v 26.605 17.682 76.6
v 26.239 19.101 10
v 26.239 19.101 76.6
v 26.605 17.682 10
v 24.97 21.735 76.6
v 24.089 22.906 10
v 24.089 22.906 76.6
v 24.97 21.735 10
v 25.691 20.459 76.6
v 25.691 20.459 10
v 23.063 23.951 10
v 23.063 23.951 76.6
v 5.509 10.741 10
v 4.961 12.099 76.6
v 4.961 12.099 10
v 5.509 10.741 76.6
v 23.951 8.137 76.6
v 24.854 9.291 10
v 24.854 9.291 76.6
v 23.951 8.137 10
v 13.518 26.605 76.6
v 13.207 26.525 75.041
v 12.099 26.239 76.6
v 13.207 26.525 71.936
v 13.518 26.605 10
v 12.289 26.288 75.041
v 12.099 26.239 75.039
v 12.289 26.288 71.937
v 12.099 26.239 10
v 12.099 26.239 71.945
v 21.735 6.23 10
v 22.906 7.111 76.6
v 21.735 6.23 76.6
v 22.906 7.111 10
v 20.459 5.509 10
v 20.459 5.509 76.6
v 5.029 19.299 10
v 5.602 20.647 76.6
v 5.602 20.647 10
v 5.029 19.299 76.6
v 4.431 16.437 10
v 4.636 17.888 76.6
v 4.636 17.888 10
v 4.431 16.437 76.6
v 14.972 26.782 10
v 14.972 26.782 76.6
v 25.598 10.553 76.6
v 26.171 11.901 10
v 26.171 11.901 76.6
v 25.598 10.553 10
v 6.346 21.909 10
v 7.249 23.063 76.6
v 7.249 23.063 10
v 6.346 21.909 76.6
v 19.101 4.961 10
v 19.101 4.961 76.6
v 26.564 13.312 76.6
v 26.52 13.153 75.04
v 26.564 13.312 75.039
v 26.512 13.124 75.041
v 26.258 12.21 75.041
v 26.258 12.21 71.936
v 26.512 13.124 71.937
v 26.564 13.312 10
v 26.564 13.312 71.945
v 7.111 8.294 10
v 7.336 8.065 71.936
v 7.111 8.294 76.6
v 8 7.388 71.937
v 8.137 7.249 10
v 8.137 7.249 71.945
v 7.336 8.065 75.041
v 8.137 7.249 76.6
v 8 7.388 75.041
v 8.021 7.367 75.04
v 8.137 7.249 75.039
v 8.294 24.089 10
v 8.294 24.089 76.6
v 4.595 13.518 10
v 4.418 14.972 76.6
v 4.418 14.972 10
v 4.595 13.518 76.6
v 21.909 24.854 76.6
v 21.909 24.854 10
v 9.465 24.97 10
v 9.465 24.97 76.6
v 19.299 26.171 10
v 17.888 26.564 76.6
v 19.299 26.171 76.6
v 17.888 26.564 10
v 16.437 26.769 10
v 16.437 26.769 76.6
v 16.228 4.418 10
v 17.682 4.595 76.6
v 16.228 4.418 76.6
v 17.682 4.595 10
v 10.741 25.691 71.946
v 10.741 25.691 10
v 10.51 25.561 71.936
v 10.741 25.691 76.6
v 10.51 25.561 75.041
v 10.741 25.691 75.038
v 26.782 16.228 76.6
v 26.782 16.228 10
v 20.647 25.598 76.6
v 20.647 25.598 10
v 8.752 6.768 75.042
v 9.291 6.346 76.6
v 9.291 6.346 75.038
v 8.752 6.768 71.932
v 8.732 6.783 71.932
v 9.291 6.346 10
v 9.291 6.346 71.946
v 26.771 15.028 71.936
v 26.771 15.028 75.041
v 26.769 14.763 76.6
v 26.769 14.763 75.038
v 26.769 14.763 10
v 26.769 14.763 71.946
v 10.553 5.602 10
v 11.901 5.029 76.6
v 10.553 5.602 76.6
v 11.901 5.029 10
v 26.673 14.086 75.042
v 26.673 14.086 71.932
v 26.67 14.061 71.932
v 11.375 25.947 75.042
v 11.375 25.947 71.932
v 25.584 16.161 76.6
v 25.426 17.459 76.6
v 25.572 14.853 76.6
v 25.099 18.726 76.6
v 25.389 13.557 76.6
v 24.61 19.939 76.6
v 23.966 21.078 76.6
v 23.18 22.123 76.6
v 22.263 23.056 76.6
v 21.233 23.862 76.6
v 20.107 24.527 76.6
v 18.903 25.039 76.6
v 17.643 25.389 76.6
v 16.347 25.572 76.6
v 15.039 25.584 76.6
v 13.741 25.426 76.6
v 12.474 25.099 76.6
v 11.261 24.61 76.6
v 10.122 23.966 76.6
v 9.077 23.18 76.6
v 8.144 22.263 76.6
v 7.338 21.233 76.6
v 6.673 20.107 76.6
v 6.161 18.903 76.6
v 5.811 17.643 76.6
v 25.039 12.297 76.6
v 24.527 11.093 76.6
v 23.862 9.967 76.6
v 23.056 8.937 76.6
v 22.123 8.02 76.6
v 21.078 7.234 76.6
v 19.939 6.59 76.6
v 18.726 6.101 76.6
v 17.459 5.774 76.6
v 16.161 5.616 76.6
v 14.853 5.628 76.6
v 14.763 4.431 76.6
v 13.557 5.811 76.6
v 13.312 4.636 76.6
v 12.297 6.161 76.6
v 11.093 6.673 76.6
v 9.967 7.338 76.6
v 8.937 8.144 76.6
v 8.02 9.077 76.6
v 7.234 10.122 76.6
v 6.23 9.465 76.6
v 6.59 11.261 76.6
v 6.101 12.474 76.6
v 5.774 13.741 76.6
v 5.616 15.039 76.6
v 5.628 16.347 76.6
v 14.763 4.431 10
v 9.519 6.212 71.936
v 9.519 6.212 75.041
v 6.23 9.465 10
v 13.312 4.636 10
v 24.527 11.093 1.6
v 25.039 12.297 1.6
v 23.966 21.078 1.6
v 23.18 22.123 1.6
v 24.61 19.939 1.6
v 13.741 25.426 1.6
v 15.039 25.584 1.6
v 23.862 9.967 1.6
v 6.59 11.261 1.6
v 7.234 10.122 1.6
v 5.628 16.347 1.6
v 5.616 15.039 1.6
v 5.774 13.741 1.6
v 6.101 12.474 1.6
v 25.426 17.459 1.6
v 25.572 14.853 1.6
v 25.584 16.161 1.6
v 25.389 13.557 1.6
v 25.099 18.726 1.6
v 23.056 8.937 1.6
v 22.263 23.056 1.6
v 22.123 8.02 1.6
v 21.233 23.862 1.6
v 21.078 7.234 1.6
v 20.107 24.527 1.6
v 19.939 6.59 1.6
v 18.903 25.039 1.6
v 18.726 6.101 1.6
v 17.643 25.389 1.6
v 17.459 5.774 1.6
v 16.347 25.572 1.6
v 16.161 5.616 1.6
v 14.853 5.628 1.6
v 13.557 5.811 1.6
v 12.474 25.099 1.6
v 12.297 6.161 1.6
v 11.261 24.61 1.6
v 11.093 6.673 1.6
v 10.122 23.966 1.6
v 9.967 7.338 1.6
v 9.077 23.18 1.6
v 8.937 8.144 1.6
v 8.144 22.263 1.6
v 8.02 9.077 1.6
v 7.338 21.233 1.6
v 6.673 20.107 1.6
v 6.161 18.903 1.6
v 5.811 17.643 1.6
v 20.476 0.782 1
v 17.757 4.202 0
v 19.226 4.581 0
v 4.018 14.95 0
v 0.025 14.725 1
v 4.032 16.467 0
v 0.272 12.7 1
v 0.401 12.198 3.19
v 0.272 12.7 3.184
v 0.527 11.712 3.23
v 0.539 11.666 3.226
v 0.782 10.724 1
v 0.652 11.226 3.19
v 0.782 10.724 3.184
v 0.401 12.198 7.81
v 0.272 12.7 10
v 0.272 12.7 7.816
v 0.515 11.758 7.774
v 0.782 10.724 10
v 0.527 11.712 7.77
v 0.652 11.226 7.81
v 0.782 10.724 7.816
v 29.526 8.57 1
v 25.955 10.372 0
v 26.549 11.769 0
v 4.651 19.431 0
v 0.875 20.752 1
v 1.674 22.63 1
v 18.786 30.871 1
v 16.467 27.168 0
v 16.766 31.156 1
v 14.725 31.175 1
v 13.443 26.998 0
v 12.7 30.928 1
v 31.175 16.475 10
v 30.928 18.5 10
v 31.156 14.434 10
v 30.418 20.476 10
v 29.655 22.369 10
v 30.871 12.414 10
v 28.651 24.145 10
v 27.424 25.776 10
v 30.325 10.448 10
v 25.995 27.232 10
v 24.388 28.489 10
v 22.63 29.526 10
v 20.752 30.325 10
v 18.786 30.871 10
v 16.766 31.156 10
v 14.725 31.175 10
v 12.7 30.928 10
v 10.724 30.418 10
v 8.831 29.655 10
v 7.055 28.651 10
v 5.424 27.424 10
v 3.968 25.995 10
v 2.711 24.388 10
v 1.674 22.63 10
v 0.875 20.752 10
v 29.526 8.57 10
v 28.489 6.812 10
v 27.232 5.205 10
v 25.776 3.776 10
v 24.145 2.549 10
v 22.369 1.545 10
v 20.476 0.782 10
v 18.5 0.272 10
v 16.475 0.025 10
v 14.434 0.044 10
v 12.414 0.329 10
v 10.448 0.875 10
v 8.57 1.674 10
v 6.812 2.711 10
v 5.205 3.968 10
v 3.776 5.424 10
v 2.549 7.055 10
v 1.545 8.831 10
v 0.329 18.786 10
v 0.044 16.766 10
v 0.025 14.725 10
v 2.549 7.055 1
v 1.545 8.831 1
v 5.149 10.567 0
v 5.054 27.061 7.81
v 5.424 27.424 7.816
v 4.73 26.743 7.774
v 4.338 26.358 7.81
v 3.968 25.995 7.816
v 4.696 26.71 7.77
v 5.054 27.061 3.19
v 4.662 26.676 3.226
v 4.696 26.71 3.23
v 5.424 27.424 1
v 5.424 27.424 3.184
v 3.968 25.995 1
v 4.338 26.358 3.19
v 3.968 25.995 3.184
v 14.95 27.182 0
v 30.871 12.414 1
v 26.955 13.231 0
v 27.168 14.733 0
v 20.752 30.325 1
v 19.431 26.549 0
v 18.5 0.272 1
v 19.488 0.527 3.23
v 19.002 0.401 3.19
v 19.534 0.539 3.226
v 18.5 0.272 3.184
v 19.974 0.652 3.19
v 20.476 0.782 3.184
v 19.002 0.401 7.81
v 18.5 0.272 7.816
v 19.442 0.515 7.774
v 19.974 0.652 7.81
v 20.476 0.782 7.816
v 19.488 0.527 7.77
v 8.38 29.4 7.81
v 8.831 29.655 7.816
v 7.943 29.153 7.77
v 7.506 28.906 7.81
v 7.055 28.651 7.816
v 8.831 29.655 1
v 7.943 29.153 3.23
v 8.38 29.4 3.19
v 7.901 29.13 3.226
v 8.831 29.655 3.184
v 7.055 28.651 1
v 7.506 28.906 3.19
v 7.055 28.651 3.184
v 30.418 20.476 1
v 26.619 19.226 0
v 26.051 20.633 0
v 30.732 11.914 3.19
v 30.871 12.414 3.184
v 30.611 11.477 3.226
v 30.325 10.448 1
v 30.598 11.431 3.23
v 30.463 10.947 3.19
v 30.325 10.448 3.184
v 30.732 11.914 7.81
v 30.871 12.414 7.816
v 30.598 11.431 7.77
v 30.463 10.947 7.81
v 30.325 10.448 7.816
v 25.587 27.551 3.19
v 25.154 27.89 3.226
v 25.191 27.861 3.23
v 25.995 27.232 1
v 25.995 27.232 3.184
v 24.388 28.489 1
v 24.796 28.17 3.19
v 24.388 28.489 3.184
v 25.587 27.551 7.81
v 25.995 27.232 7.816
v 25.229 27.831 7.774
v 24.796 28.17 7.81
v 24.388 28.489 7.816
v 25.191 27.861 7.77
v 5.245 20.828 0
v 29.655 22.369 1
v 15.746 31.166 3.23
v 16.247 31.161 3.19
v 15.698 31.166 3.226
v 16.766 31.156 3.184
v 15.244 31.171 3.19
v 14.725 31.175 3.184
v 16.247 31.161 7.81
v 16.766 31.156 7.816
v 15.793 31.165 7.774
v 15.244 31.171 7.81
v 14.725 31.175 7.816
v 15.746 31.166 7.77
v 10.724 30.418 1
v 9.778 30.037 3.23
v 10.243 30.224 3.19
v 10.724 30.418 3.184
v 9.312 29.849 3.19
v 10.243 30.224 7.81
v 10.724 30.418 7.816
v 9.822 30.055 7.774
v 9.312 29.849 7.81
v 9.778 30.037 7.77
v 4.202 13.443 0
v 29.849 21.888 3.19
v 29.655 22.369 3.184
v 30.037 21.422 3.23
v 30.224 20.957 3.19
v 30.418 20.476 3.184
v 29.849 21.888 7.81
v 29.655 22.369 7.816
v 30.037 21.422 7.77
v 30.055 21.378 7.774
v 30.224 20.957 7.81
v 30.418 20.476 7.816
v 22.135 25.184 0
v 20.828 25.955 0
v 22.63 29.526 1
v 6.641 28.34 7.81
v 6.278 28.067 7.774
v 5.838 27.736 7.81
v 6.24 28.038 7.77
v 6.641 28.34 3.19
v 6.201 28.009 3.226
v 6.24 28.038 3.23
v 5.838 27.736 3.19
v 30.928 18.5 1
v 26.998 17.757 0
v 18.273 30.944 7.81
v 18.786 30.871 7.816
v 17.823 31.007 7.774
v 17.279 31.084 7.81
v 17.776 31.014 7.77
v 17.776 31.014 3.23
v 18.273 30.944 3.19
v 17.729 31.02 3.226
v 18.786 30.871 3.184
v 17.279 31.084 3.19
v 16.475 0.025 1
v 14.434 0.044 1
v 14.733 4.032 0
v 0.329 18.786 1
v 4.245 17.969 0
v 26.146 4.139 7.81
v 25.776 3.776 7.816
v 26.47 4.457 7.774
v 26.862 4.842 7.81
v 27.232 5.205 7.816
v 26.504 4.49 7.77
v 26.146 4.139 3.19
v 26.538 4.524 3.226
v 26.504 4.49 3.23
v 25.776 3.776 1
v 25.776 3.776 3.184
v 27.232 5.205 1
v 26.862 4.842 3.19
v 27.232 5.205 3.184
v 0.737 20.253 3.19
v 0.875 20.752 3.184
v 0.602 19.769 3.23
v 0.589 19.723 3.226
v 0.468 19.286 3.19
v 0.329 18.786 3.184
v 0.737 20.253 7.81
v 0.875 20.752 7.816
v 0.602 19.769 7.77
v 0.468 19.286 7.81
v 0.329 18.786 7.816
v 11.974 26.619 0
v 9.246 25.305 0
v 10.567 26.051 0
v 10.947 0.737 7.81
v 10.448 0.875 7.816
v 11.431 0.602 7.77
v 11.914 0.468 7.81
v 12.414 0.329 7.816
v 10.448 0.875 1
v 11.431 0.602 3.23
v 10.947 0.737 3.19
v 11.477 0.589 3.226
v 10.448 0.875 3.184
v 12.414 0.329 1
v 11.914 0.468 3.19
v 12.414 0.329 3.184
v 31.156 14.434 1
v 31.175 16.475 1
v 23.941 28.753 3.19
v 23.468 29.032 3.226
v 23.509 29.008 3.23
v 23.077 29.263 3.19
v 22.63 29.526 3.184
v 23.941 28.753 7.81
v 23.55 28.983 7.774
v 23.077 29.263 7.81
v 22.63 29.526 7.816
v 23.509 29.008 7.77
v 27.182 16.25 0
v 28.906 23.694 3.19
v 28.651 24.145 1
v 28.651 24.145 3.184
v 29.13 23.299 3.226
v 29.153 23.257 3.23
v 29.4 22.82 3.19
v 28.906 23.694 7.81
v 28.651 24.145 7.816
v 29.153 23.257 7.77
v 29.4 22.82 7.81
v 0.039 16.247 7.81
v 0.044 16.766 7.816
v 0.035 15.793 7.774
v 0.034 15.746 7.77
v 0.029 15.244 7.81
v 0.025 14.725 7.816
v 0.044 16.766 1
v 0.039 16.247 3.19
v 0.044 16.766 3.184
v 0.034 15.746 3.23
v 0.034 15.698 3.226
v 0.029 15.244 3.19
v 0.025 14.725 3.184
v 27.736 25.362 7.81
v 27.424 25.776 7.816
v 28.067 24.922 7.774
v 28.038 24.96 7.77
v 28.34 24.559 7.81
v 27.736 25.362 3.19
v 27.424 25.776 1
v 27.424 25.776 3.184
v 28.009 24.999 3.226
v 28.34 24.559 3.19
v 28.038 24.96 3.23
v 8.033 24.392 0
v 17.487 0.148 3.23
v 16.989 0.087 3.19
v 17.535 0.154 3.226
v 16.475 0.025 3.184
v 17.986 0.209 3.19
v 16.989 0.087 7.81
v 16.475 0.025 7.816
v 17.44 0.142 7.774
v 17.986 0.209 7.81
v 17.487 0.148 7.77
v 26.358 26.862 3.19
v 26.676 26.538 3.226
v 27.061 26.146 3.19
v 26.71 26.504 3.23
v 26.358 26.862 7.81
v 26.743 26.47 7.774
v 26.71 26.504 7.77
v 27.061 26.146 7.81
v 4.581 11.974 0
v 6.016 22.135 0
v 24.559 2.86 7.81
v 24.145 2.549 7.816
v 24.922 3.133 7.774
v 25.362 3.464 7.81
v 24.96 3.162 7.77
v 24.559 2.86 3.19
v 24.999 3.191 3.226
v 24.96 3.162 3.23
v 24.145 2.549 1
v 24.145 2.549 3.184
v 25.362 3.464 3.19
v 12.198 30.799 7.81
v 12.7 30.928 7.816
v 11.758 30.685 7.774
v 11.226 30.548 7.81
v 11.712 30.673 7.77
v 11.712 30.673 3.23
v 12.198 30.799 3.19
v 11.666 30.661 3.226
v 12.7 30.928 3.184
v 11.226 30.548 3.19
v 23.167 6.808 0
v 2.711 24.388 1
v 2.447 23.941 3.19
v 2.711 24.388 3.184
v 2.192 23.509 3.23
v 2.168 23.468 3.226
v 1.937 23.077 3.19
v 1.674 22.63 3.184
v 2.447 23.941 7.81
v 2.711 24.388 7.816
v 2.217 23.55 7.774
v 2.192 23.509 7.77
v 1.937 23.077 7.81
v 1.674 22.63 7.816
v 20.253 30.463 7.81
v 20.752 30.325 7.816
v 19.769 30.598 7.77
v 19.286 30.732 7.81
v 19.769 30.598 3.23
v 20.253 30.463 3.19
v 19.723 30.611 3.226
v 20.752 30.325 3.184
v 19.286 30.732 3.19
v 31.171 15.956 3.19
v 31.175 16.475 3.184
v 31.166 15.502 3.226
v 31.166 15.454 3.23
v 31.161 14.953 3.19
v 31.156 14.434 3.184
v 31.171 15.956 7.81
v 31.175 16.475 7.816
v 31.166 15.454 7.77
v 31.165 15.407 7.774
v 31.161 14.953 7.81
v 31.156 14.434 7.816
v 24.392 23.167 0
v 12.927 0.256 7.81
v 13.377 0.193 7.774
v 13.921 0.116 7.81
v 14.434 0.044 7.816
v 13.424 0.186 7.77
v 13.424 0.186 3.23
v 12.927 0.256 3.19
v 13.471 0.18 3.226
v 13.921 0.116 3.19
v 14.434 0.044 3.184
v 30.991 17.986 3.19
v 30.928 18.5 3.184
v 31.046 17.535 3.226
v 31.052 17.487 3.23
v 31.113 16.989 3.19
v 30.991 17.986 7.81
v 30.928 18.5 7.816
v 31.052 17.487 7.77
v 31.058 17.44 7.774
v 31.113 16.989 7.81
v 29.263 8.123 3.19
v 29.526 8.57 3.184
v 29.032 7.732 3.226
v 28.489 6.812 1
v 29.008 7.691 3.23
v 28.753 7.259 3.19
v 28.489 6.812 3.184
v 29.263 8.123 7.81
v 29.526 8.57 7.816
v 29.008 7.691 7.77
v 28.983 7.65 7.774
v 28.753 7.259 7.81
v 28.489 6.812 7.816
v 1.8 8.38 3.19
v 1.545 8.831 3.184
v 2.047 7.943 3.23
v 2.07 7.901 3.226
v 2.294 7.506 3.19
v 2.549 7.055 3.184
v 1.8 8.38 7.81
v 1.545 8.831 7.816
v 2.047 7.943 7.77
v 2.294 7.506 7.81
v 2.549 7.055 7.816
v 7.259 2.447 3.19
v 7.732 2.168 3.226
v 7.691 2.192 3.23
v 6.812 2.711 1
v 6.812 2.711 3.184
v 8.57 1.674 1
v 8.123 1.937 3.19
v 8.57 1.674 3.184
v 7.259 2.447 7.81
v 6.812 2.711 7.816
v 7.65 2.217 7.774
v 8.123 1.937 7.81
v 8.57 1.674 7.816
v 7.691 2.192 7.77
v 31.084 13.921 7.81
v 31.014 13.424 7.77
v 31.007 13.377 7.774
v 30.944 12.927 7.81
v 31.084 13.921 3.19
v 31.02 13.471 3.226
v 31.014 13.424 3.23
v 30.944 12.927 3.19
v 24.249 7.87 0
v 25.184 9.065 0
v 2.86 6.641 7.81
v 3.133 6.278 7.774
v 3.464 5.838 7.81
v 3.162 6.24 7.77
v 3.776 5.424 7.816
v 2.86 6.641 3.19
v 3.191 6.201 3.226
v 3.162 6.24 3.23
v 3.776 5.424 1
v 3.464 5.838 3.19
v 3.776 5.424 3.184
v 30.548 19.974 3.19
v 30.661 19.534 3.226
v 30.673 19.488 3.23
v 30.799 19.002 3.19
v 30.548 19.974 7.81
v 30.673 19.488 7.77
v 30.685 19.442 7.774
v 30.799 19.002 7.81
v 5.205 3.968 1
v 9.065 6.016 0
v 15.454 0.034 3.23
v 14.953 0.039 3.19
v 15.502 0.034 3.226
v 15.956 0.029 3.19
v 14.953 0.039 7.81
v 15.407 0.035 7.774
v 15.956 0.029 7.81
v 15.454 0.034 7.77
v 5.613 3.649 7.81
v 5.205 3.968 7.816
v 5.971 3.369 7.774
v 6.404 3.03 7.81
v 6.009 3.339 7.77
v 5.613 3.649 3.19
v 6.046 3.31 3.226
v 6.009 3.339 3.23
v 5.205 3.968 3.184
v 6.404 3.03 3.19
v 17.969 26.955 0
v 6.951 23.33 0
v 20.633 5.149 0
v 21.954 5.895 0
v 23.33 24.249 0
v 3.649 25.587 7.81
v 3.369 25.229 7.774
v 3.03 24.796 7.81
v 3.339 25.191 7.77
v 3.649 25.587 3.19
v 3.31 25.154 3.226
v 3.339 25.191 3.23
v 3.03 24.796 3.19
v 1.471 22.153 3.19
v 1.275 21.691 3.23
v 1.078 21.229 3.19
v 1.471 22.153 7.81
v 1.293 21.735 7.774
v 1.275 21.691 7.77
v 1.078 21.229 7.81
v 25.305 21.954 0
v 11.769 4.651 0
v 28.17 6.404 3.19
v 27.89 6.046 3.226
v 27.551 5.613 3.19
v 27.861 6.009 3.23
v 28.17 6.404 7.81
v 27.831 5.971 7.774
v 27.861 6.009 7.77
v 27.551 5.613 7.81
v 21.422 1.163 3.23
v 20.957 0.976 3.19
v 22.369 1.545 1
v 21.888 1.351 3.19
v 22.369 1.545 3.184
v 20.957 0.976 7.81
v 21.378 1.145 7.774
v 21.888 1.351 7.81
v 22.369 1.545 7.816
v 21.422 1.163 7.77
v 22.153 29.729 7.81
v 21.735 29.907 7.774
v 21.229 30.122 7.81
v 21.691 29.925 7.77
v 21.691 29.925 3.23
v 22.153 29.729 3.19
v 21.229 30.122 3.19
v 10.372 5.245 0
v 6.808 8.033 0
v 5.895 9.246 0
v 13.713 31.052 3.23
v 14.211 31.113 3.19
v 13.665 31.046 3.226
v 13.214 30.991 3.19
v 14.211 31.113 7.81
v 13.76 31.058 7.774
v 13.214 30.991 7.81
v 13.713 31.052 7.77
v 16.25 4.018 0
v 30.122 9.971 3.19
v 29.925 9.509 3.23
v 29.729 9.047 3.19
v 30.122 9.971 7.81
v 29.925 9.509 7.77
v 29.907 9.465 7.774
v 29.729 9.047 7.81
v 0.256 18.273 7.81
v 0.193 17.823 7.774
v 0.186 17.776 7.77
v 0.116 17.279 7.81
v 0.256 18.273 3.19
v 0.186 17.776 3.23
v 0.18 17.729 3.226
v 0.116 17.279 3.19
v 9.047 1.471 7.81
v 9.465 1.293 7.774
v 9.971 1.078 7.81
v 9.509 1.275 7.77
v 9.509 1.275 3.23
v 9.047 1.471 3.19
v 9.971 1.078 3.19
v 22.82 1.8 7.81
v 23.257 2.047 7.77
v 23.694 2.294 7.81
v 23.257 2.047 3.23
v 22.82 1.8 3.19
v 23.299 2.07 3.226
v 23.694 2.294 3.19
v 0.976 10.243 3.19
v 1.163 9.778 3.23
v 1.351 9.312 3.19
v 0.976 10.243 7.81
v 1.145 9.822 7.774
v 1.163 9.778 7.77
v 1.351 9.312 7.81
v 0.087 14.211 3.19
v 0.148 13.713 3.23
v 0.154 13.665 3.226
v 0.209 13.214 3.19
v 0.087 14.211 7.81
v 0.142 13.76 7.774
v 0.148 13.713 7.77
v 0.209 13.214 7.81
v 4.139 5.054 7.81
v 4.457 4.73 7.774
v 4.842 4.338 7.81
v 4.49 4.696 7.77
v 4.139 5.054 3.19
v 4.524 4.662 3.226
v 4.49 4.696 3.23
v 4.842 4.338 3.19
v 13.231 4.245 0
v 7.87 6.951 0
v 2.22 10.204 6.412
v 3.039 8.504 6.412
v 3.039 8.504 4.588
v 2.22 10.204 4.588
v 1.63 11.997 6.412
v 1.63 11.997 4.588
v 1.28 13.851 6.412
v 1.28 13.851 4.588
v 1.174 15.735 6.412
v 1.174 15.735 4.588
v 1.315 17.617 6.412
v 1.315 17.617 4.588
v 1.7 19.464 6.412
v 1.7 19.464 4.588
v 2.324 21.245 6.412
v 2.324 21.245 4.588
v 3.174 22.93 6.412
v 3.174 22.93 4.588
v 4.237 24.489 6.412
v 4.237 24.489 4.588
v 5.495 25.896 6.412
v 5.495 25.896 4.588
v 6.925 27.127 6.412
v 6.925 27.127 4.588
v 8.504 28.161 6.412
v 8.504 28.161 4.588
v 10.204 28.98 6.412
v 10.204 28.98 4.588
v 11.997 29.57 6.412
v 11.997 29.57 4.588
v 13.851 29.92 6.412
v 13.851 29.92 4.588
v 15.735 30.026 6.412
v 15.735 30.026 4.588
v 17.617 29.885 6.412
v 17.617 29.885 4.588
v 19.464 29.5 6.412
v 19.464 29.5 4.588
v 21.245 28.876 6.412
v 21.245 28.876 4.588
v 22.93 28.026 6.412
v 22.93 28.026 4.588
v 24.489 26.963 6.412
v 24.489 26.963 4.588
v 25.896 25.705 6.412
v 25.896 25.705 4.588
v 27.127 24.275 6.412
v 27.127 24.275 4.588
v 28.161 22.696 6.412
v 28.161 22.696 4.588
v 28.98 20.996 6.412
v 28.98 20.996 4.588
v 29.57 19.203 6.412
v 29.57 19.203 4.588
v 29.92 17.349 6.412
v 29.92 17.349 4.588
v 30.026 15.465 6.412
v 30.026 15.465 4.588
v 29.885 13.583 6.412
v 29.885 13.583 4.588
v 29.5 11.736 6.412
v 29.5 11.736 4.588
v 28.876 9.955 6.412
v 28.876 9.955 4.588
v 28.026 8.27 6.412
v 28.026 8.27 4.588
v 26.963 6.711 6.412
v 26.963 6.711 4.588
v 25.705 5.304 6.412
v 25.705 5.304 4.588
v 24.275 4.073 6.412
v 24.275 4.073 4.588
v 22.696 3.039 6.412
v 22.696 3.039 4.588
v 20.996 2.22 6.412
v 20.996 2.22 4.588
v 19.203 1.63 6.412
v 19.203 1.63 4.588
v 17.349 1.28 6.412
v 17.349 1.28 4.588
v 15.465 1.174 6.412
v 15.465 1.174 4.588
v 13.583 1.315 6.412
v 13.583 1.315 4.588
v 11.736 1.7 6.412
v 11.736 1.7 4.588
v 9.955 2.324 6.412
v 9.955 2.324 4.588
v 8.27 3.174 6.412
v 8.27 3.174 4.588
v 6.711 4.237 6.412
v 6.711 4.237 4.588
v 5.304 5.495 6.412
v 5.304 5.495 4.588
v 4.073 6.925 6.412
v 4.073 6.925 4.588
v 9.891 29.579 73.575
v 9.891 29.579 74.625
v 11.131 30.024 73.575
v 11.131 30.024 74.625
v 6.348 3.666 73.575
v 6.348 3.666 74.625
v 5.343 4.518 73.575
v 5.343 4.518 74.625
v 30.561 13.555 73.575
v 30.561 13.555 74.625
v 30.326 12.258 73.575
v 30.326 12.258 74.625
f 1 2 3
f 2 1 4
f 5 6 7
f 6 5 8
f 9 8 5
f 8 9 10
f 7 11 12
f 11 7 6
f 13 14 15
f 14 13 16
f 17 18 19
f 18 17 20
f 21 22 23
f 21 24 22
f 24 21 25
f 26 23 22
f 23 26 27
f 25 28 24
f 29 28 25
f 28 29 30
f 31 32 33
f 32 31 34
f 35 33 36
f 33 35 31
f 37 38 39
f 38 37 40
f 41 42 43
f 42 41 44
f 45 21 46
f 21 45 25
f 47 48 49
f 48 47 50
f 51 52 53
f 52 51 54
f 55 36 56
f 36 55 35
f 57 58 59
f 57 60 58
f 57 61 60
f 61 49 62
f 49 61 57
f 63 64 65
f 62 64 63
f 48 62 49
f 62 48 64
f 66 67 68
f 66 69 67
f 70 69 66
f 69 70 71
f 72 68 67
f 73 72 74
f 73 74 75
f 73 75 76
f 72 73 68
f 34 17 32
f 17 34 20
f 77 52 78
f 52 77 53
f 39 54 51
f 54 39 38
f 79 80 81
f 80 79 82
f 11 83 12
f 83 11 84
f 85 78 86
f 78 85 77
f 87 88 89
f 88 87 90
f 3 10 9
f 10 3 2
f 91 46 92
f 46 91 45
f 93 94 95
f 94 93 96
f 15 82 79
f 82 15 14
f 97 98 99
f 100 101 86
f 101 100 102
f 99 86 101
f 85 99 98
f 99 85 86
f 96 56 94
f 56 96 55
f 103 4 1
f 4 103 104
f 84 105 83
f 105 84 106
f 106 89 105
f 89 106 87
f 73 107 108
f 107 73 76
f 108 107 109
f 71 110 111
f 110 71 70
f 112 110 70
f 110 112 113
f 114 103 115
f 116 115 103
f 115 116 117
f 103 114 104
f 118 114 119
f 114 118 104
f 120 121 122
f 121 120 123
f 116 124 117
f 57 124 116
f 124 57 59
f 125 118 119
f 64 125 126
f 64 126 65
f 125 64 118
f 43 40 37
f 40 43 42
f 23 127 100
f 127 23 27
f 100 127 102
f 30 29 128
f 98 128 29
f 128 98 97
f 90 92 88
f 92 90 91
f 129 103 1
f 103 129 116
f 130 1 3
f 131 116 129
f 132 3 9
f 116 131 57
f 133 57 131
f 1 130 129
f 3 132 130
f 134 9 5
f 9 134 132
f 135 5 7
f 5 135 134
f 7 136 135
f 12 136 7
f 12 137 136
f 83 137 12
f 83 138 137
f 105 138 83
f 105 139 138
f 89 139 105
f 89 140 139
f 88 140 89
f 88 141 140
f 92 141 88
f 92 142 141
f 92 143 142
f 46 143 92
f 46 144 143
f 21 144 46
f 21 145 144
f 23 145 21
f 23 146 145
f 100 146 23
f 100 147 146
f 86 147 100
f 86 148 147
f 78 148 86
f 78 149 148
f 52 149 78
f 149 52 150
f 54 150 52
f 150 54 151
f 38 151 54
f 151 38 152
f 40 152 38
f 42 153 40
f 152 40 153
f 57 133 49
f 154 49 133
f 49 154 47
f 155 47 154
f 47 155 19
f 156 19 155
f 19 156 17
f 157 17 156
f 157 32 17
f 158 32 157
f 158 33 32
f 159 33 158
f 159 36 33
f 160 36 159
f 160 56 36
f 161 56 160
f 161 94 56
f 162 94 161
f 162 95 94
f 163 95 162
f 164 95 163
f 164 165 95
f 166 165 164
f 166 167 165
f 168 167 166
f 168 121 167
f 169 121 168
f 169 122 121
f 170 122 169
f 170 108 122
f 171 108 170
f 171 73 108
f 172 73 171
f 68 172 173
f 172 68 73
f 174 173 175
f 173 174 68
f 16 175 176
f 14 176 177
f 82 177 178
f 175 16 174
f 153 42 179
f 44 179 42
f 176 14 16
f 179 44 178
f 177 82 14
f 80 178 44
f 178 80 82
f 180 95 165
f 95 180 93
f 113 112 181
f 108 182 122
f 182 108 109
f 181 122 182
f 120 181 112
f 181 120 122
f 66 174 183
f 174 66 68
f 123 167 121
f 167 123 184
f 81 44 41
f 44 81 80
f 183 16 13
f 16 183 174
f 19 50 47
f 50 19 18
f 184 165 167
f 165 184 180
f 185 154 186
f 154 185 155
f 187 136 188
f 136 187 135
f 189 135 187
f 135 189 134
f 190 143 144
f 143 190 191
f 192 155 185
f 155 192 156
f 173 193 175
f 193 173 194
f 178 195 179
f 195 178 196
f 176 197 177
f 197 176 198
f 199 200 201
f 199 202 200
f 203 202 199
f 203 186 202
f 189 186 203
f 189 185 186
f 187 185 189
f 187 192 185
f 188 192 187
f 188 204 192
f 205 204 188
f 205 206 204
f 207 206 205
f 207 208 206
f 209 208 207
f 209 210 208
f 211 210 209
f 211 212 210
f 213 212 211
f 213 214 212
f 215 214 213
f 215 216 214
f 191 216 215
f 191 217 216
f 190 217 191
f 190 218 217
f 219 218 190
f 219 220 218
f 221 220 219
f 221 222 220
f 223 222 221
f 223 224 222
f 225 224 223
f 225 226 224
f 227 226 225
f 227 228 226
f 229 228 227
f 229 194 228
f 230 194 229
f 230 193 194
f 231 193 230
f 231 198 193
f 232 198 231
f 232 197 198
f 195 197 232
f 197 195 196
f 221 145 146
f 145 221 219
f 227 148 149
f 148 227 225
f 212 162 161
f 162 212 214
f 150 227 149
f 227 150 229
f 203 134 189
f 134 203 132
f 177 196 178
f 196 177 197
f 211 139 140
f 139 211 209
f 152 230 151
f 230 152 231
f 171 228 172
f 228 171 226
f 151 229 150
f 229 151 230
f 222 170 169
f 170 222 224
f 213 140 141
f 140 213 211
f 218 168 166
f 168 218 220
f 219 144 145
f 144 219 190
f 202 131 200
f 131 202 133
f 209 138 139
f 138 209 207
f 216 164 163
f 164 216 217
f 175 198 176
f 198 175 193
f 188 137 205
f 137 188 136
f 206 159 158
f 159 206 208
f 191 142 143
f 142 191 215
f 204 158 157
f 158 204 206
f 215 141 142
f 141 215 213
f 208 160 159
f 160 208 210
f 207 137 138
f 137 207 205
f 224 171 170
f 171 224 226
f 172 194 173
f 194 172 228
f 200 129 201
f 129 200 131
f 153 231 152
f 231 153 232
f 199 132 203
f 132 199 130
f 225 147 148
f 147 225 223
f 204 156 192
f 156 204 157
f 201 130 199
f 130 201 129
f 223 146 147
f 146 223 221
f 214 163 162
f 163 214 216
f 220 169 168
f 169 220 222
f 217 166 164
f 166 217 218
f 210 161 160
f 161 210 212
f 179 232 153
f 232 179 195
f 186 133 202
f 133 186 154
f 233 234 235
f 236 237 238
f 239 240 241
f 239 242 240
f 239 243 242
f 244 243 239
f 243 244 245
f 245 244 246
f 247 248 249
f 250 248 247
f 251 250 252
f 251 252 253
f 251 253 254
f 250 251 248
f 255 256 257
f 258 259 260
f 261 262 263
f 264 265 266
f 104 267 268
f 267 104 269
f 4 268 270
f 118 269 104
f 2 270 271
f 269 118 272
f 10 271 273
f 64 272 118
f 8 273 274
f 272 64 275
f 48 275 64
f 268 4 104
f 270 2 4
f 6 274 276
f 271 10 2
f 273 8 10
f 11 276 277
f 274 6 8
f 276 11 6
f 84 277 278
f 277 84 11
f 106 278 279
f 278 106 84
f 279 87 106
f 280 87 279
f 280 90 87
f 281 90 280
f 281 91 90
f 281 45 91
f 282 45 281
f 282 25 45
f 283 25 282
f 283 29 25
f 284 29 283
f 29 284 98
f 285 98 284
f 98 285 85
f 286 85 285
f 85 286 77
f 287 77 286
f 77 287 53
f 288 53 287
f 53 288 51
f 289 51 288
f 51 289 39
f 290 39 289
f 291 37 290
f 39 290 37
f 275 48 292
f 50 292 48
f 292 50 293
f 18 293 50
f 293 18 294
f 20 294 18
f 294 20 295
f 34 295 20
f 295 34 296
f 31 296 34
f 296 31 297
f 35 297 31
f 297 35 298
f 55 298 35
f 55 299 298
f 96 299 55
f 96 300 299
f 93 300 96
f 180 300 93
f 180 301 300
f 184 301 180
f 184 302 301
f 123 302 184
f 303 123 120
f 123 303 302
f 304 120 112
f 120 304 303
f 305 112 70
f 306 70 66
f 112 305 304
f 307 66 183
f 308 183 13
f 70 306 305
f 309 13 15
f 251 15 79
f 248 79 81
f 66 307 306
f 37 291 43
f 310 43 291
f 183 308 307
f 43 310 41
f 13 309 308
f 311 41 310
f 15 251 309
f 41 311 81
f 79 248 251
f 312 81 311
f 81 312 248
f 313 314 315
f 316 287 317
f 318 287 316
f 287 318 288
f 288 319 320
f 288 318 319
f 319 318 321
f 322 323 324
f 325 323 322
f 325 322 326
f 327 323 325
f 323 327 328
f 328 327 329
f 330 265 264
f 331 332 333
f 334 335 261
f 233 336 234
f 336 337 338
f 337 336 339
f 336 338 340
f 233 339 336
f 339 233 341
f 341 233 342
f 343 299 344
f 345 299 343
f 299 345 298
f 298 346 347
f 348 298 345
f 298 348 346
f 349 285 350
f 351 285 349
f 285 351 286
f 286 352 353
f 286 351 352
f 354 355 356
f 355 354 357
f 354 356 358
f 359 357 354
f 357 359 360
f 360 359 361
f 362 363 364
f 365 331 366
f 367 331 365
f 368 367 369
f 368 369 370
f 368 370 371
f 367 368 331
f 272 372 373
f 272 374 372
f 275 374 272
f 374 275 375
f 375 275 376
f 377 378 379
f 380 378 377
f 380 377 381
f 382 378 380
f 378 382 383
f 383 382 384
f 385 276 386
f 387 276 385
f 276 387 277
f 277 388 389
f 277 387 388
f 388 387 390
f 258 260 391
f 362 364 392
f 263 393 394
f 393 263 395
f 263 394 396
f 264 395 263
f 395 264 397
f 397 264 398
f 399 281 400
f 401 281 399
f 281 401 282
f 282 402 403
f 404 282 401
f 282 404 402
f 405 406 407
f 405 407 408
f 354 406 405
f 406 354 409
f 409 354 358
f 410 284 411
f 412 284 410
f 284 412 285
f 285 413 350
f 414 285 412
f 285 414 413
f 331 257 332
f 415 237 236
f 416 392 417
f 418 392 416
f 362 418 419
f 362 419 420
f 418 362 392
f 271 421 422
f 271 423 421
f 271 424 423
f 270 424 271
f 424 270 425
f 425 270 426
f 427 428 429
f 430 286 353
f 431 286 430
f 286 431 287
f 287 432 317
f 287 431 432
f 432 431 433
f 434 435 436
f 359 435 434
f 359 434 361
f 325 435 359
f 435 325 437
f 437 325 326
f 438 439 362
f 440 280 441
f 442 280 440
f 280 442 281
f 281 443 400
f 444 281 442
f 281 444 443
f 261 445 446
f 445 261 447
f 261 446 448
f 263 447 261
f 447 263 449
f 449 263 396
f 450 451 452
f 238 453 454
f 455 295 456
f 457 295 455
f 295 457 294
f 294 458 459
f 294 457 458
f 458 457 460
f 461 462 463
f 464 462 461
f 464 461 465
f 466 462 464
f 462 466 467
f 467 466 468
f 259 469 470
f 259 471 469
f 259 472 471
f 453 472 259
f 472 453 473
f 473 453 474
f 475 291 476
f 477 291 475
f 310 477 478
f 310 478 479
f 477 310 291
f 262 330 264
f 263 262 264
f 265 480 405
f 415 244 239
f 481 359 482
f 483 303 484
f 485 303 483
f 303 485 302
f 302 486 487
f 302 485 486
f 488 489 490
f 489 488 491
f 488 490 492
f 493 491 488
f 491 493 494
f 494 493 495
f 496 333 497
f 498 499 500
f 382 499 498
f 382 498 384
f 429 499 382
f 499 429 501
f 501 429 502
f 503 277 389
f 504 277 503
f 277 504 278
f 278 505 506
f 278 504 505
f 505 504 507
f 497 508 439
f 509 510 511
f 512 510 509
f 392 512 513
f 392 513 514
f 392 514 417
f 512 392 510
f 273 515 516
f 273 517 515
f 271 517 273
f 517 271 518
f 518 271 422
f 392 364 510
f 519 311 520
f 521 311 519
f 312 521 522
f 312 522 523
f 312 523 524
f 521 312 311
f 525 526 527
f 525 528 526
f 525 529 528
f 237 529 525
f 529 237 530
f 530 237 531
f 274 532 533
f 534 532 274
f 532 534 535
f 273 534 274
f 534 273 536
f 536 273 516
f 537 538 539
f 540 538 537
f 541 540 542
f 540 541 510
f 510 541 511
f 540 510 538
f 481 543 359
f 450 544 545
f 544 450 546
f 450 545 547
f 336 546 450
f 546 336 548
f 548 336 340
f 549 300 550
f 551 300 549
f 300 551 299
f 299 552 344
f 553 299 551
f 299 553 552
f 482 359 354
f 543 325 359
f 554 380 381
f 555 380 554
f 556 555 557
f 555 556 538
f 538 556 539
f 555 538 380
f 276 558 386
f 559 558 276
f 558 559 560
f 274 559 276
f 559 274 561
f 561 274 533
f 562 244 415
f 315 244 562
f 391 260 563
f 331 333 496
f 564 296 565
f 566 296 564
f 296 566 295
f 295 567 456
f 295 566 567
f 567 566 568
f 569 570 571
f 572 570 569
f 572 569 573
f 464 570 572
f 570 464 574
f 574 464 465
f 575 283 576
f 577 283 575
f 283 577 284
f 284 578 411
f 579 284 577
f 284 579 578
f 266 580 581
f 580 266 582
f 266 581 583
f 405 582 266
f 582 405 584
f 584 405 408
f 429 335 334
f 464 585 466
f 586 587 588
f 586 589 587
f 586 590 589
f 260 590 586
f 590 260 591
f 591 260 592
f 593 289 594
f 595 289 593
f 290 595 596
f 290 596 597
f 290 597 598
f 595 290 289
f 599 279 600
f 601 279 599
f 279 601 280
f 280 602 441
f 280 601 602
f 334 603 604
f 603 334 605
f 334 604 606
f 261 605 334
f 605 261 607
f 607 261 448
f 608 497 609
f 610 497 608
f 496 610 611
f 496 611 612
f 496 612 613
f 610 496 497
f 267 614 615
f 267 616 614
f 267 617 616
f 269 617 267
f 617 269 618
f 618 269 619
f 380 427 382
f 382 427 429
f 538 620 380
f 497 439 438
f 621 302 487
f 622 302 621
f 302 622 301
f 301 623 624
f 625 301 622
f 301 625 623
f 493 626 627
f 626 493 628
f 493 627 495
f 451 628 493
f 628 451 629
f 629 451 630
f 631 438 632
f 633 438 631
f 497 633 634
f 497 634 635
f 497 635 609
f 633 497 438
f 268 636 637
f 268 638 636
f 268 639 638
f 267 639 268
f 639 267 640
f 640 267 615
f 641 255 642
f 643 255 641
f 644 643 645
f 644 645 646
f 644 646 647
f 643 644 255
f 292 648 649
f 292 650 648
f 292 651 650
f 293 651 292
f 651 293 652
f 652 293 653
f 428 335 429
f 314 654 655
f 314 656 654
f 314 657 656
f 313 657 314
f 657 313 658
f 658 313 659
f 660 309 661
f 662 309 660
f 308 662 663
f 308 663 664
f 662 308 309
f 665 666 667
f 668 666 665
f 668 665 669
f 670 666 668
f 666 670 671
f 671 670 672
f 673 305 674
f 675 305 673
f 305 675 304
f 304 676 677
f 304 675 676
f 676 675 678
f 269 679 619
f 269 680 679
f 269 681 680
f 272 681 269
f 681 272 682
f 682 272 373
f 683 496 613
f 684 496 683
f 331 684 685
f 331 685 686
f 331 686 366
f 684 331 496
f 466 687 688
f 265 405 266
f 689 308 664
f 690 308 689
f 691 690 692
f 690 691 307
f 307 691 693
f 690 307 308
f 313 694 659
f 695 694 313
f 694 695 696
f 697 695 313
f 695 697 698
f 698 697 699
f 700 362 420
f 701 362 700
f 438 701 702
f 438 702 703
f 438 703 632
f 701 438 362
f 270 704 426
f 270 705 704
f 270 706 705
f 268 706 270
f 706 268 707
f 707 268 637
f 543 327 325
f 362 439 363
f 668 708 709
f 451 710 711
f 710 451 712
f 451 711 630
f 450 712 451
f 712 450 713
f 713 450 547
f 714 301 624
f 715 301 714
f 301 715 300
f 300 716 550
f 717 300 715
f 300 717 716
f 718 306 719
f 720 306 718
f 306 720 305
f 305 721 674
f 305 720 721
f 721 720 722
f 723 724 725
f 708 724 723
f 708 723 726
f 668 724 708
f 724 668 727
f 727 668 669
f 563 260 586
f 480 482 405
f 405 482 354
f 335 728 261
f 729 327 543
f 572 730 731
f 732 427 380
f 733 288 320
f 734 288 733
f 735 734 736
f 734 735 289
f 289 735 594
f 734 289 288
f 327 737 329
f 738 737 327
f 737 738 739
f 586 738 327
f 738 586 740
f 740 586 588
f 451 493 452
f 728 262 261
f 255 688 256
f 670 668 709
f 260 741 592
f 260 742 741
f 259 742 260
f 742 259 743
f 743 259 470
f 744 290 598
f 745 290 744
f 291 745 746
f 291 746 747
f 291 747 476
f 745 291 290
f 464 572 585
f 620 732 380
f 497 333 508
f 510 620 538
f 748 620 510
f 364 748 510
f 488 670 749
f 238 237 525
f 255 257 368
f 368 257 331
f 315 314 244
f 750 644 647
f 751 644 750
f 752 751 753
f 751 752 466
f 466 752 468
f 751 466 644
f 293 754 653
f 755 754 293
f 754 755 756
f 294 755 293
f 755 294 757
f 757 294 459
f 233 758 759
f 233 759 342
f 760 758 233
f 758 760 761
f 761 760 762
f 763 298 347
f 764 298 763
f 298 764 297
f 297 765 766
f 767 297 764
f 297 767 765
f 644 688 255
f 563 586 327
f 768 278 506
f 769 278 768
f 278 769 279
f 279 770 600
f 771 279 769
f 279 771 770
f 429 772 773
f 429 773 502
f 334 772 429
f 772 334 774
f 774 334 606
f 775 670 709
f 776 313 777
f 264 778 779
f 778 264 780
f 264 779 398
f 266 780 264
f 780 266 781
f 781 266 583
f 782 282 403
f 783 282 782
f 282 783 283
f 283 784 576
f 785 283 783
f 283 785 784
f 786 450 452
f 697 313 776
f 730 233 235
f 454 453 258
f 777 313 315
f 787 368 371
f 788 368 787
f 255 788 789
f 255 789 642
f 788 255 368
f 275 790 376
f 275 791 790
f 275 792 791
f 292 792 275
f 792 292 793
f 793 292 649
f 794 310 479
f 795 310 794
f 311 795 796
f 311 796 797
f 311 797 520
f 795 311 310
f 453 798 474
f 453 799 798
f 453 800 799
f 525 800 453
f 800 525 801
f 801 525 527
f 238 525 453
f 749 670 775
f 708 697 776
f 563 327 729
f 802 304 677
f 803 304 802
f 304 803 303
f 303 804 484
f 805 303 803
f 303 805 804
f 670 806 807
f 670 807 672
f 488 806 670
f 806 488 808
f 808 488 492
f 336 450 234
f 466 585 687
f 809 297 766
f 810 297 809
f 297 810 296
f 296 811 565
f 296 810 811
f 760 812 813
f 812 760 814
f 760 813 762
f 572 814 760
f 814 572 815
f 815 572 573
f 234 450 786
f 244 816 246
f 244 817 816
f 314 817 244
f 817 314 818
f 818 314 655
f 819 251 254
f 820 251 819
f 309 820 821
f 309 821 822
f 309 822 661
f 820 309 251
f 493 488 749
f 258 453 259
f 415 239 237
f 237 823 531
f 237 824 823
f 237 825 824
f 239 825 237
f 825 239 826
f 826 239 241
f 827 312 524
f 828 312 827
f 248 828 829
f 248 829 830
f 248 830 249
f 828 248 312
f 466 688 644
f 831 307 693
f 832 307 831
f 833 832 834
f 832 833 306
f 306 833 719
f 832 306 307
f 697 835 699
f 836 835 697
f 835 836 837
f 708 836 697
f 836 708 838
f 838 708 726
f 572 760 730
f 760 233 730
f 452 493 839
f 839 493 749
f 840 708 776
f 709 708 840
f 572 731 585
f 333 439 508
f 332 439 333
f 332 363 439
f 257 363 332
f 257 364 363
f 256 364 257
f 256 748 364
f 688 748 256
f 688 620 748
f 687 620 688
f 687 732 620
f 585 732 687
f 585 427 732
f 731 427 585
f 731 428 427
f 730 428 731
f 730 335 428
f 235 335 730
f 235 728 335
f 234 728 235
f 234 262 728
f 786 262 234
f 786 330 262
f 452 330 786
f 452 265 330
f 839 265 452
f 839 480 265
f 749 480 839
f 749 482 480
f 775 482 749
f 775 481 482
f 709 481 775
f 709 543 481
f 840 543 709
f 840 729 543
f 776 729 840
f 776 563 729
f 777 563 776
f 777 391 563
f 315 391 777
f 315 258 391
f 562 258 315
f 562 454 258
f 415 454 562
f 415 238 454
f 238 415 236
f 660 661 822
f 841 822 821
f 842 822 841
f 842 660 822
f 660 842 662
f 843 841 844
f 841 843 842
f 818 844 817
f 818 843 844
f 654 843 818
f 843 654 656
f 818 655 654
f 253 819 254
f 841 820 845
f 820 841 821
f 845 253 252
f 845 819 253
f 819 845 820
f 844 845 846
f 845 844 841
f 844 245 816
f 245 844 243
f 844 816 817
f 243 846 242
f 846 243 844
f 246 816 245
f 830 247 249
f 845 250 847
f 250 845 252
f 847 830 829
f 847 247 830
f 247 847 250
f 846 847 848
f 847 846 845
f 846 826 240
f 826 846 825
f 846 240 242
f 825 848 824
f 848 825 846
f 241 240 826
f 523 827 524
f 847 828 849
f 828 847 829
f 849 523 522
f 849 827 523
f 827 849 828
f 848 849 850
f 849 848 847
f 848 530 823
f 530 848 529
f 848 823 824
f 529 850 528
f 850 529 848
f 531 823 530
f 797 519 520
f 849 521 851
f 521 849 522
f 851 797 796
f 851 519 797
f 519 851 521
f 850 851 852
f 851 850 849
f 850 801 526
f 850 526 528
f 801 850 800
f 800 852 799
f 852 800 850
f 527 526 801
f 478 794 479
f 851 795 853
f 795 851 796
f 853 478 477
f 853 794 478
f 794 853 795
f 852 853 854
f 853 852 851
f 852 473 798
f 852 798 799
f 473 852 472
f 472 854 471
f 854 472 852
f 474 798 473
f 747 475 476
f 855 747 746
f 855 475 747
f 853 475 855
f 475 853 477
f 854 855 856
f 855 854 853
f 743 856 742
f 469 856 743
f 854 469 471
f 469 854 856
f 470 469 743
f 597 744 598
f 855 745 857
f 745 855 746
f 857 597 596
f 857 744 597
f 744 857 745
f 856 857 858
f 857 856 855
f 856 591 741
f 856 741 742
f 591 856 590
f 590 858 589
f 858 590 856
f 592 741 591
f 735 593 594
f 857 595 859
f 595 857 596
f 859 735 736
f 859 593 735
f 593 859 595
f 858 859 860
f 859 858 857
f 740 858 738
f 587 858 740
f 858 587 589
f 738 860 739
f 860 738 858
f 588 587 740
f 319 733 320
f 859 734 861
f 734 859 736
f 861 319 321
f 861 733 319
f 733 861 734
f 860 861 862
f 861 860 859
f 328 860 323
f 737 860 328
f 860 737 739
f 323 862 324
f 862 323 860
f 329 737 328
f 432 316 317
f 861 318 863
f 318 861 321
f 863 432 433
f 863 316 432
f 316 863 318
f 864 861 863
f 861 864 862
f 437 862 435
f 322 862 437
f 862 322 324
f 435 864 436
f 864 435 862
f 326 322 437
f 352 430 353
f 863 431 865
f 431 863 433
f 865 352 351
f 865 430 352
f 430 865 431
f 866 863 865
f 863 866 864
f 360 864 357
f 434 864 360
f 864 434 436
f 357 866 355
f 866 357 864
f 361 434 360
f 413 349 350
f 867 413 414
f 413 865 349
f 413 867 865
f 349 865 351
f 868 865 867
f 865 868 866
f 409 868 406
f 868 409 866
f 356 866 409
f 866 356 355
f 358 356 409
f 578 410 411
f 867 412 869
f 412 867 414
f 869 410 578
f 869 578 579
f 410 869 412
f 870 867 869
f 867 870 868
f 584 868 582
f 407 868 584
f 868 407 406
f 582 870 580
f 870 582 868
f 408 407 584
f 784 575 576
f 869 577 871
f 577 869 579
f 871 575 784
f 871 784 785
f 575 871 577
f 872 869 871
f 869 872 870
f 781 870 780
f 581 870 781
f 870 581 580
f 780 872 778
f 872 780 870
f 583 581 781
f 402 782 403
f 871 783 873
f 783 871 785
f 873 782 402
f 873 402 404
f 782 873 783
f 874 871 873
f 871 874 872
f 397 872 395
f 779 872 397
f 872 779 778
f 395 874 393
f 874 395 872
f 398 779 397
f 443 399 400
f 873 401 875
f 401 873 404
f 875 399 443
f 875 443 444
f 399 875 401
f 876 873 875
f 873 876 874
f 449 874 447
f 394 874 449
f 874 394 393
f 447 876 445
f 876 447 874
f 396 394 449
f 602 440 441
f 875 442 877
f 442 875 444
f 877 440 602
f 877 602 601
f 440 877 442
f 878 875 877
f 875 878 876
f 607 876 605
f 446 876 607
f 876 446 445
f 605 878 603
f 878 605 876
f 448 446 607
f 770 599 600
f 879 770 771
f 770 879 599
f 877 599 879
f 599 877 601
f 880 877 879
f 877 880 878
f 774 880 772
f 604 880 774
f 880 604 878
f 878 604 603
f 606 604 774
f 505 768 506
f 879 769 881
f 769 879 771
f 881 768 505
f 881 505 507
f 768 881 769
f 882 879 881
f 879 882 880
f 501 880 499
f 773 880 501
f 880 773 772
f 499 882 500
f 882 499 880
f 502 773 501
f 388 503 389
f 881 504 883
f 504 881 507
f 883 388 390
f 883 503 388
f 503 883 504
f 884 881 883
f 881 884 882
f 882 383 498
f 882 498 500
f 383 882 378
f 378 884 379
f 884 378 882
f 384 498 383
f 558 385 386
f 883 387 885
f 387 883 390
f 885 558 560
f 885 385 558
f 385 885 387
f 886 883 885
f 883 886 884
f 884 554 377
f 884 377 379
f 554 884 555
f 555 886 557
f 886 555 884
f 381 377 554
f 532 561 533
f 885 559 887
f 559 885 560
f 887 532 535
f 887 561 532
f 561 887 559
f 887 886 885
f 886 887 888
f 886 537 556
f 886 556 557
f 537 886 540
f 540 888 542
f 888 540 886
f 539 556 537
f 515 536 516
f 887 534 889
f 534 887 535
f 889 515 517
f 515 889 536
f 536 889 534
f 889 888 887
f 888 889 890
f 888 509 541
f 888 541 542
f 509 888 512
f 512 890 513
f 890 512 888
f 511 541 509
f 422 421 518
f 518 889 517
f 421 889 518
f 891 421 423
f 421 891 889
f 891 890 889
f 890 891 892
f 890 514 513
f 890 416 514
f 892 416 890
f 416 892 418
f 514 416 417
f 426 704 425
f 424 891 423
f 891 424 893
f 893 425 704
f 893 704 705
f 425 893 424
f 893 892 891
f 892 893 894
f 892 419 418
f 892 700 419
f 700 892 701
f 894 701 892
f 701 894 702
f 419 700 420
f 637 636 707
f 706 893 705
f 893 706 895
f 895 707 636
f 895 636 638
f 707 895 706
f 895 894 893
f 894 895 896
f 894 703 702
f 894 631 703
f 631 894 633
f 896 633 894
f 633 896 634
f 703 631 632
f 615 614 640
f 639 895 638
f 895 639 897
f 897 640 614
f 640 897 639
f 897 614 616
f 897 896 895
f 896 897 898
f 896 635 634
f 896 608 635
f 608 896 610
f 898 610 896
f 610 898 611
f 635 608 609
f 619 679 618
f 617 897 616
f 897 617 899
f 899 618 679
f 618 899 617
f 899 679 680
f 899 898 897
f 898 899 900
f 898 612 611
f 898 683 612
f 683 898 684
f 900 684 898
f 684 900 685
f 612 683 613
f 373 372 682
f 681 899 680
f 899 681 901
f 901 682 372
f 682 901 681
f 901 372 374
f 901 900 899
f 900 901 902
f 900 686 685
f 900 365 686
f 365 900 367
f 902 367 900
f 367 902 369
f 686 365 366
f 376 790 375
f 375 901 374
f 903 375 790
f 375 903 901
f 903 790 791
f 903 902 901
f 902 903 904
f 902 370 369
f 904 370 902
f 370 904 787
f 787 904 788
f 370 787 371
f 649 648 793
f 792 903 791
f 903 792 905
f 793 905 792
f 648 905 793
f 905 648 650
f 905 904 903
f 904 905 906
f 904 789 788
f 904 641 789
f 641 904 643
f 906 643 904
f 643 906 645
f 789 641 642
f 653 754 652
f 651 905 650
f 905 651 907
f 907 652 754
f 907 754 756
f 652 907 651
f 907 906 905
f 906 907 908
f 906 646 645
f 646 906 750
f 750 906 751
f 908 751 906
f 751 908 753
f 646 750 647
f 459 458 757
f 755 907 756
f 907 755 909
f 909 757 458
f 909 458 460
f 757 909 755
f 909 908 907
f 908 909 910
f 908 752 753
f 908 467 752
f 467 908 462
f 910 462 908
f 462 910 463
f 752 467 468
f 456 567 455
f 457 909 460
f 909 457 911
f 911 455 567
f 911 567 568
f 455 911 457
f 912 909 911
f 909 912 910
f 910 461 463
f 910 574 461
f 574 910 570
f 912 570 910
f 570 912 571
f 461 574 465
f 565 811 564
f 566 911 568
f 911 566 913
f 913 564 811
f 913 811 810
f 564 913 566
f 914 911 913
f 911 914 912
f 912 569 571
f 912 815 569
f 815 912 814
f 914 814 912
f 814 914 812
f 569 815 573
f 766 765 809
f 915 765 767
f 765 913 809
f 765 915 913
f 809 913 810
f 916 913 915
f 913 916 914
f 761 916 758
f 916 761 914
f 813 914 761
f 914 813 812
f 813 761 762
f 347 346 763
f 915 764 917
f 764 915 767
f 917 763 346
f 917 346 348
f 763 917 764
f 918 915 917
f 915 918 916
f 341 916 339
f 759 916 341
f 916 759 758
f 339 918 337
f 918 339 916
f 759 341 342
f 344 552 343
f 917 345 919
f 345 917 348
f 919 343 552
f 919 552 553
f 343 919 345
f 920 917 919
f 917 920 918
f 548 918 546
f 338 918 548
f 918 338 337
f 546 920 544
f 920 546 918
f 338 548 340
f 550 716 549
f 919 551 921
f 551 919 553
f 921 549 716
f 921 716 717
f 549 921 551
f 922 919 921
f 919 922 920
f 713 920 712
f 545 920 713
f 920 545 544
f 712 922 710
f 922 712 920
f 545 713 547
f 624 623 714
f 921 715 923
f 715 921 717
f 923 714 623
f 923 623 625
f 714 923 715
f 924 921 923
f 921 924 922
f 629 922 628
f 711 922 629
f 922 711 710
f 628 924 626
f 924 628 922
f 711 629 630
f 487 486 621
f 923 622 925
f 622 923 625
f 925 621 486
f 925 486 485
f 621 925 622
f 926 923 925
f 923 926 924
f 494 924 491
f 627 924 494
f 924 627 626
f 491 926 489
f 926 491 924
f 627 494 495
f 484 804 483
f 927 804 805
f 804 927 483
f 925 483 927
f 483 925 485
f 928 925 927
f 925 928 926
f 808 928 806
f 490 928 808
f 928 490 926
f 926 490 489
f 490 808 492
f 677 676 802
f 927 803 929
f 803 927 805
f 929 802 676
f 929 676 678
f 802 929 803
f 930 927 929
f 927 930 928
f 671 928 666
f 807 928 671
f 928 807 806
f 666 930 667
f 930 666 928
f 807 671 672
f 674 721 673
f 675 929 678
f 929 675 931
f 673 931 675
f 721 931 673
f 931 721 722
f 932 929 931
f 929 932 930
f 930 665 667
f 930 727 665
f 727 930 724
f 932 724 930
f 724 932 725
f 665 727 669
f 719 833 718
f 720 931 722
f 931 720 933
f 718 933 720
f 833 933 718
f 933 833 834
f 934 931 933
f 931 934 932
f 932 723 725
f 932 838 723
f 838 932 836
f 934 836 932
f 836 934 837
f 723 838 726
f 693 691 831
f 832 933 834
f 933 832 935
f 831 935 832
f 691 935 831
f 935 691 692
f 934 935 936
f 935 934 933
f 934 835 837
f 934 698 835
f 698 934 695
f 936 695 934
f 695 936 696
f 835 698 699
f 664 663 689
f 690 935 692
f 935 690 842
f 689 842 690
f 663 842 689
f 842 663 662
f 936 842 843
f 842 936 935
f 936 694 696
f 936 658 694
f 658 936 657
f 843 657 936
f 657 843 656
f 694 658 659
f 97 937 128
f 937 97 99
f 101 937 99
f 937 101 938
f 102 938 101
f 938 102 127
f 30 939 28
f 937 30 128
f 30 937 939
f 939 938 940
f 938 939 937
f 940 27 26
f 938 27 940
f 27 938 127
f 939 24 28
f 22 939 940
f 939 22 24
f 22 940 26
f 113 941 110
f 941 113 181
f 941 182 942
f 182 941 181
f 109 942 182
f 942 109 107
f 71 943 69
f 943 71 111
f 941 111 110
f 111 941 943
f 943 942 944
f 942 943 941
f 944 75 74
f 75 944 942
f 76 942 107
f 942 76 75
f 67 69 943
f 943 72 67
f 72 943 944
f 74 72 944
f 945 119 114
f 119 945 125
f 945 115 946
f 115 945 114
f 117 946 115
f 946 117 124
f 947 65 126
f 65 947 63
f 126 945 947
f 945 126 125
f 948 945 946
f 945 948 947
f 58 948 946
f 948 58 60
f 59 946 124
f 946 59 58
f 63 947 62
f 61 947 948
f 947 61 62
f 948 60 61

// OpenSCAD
// Puzzlebox by RevK, @TheRealRevK www.me.uk
// Thingiverse examples and instructions https://www.thingiverse.com/thing:2410748
// GitHub source https://github.com/revk/PuzzleBox
// Get new random custom maze gift boxes from https://www.me.uk/puzzlebox
// Created 2022-12-22T07:51:20Z 2001:700:710:aa:8000:0:4:2
// Total parts: m=4
// Part to make: n=1
// Maze on inside (hard): i
// Nubs: N=3
// Base height: b=10
// Core diameter for content: c=20
// Core height for content: h=75
// Base thickness: B=1.6
// Base gap (Z clearance): G=0.4
// Wall thickness: w=1.2
// Maze thickness: t=4
// Maze spacing: z=5
// Maze top margin: M=1
// Maze complexity: X=7
// Thickness of park ridge to click closed: p=0.7
// General X/Y clearance: g=0.4
// Number of outer sides: s=7
// Outer rounding on ends: r=2
// Grip depth: R=1.333333
// Text font for end (optional): e=4i
// Text has diagonal edges (very slow): Z
// Scale side text (i.e. if too long): T=1
// Extra clearance on radius for nub: y=0.1
// Extra clearance on height of nub: Z=0.2
module cuttext(){translate([0,0,-1000])minkowski(){rotate([0,0,22.5])cylinder(h=0,d1=0,d2=0,$fn=8);linear_extrude(height=1000,convexity=10)mirror([1,0,0])children();}}
module outer(h,r){e=2000;minkowski(){cylinder(r1=0,r2=e,h=e,$fn=24);cylinder(h=h-e,r=r,$fn=7);}}
scale(0.001){
// Part 1 (10.00mm to 11.20mm and 15.60mm/15.60mm base)
translate([15600,15600,0])
rotate([0,0,25.714286]){
difference(){union(){difference(){
translate([0,0,400])cylinder(r=11200,h=76200,$fn=48);translate([0,0,1600])cylinder(r=10000,h=76600,$fn=48);
}
difference(){
hull(){cylinder(r=11600,h=10000,$fn=48);translate([0,0,1000])cylinder(r=15600,h=9000,$fn=48);}
translate([0,0,1600])cylinder(r=10400,h=76600,$fn=48);
}
}
rotate([0,0,3.750000])translate([0,0,5500])rotate_extrude(convexity=10,$fn=48)translate([16933,0,0])circle(r=2667,$fn=9);
}
rotate([0,0,354.000000])for(a=[0:120.000000:359])rotate([0,0,a])polyhedron(points=[[-1449,11005,71900],[-484,11089,71900],[484,11089,71900],[1449,11005,71900],[-1449,11005,73575],[-659,15086,73575],[659,15086,73575],[1449,11005,73575],[-1449,11005,74625],[-659,15086,74625],[659,15086,74625],[1449,11005,74625],[-1449,11005,75050],[-484,11089,75050],[484,11089,75050],[1449,11005,75050],[-1410,10708,71900],[-471,10790,71900],[471,10790,71900],[1410,10708,71900],[-1410,10708,73575],[-471,10790,73575],[471,10790,73575],[1410,10708,73575],[-1410,10708,74625],[-471,10790,74625],[471,10790,74625],[1410,10708,74625],[-1410,10708,75050],[-471,10790,75050],[471,10790,75050],[1410,10708,75050],],faces=[[20,21,17],[20,17,16],[21,22,18],[21,18,17],[22,23,19],[22,19,18],[24,25,21],[24,21,20],[25,26,22],[25,22,21],[26,27,23],[26,23,22],[28,29,25],[28,25,24],[29,30,26],[29,26,25],[30,31,27],[30,27,26],[4,20,16],[4,16,0],[23,7,3],[23,3,19],[8,24,20],[8,20,4],[27,11,7],[27,7,23],[12,28,24],[12,24,8],[31,15,11],[31,11,27],[28,12,13],[28,13,29],[0,16,17],[0,17,1],[29,13,14],[29,14,30],[1,17,18],[1,18,2],[30,14,15],[30,15,31],[2,18,19],[2,19,3],[0,1,5],[0,5,4],[4,5,9],[4,9,8],[8,9,12],[9,13,12],[1,2,6],[1,6,5],[5,6,10],[5,10,9],[9,10,14],[9,14,13],[2,3,6],[3,7,6],[6,7,11],[6,11,10],[10,11,15],[10,15,14],]);
}
}
